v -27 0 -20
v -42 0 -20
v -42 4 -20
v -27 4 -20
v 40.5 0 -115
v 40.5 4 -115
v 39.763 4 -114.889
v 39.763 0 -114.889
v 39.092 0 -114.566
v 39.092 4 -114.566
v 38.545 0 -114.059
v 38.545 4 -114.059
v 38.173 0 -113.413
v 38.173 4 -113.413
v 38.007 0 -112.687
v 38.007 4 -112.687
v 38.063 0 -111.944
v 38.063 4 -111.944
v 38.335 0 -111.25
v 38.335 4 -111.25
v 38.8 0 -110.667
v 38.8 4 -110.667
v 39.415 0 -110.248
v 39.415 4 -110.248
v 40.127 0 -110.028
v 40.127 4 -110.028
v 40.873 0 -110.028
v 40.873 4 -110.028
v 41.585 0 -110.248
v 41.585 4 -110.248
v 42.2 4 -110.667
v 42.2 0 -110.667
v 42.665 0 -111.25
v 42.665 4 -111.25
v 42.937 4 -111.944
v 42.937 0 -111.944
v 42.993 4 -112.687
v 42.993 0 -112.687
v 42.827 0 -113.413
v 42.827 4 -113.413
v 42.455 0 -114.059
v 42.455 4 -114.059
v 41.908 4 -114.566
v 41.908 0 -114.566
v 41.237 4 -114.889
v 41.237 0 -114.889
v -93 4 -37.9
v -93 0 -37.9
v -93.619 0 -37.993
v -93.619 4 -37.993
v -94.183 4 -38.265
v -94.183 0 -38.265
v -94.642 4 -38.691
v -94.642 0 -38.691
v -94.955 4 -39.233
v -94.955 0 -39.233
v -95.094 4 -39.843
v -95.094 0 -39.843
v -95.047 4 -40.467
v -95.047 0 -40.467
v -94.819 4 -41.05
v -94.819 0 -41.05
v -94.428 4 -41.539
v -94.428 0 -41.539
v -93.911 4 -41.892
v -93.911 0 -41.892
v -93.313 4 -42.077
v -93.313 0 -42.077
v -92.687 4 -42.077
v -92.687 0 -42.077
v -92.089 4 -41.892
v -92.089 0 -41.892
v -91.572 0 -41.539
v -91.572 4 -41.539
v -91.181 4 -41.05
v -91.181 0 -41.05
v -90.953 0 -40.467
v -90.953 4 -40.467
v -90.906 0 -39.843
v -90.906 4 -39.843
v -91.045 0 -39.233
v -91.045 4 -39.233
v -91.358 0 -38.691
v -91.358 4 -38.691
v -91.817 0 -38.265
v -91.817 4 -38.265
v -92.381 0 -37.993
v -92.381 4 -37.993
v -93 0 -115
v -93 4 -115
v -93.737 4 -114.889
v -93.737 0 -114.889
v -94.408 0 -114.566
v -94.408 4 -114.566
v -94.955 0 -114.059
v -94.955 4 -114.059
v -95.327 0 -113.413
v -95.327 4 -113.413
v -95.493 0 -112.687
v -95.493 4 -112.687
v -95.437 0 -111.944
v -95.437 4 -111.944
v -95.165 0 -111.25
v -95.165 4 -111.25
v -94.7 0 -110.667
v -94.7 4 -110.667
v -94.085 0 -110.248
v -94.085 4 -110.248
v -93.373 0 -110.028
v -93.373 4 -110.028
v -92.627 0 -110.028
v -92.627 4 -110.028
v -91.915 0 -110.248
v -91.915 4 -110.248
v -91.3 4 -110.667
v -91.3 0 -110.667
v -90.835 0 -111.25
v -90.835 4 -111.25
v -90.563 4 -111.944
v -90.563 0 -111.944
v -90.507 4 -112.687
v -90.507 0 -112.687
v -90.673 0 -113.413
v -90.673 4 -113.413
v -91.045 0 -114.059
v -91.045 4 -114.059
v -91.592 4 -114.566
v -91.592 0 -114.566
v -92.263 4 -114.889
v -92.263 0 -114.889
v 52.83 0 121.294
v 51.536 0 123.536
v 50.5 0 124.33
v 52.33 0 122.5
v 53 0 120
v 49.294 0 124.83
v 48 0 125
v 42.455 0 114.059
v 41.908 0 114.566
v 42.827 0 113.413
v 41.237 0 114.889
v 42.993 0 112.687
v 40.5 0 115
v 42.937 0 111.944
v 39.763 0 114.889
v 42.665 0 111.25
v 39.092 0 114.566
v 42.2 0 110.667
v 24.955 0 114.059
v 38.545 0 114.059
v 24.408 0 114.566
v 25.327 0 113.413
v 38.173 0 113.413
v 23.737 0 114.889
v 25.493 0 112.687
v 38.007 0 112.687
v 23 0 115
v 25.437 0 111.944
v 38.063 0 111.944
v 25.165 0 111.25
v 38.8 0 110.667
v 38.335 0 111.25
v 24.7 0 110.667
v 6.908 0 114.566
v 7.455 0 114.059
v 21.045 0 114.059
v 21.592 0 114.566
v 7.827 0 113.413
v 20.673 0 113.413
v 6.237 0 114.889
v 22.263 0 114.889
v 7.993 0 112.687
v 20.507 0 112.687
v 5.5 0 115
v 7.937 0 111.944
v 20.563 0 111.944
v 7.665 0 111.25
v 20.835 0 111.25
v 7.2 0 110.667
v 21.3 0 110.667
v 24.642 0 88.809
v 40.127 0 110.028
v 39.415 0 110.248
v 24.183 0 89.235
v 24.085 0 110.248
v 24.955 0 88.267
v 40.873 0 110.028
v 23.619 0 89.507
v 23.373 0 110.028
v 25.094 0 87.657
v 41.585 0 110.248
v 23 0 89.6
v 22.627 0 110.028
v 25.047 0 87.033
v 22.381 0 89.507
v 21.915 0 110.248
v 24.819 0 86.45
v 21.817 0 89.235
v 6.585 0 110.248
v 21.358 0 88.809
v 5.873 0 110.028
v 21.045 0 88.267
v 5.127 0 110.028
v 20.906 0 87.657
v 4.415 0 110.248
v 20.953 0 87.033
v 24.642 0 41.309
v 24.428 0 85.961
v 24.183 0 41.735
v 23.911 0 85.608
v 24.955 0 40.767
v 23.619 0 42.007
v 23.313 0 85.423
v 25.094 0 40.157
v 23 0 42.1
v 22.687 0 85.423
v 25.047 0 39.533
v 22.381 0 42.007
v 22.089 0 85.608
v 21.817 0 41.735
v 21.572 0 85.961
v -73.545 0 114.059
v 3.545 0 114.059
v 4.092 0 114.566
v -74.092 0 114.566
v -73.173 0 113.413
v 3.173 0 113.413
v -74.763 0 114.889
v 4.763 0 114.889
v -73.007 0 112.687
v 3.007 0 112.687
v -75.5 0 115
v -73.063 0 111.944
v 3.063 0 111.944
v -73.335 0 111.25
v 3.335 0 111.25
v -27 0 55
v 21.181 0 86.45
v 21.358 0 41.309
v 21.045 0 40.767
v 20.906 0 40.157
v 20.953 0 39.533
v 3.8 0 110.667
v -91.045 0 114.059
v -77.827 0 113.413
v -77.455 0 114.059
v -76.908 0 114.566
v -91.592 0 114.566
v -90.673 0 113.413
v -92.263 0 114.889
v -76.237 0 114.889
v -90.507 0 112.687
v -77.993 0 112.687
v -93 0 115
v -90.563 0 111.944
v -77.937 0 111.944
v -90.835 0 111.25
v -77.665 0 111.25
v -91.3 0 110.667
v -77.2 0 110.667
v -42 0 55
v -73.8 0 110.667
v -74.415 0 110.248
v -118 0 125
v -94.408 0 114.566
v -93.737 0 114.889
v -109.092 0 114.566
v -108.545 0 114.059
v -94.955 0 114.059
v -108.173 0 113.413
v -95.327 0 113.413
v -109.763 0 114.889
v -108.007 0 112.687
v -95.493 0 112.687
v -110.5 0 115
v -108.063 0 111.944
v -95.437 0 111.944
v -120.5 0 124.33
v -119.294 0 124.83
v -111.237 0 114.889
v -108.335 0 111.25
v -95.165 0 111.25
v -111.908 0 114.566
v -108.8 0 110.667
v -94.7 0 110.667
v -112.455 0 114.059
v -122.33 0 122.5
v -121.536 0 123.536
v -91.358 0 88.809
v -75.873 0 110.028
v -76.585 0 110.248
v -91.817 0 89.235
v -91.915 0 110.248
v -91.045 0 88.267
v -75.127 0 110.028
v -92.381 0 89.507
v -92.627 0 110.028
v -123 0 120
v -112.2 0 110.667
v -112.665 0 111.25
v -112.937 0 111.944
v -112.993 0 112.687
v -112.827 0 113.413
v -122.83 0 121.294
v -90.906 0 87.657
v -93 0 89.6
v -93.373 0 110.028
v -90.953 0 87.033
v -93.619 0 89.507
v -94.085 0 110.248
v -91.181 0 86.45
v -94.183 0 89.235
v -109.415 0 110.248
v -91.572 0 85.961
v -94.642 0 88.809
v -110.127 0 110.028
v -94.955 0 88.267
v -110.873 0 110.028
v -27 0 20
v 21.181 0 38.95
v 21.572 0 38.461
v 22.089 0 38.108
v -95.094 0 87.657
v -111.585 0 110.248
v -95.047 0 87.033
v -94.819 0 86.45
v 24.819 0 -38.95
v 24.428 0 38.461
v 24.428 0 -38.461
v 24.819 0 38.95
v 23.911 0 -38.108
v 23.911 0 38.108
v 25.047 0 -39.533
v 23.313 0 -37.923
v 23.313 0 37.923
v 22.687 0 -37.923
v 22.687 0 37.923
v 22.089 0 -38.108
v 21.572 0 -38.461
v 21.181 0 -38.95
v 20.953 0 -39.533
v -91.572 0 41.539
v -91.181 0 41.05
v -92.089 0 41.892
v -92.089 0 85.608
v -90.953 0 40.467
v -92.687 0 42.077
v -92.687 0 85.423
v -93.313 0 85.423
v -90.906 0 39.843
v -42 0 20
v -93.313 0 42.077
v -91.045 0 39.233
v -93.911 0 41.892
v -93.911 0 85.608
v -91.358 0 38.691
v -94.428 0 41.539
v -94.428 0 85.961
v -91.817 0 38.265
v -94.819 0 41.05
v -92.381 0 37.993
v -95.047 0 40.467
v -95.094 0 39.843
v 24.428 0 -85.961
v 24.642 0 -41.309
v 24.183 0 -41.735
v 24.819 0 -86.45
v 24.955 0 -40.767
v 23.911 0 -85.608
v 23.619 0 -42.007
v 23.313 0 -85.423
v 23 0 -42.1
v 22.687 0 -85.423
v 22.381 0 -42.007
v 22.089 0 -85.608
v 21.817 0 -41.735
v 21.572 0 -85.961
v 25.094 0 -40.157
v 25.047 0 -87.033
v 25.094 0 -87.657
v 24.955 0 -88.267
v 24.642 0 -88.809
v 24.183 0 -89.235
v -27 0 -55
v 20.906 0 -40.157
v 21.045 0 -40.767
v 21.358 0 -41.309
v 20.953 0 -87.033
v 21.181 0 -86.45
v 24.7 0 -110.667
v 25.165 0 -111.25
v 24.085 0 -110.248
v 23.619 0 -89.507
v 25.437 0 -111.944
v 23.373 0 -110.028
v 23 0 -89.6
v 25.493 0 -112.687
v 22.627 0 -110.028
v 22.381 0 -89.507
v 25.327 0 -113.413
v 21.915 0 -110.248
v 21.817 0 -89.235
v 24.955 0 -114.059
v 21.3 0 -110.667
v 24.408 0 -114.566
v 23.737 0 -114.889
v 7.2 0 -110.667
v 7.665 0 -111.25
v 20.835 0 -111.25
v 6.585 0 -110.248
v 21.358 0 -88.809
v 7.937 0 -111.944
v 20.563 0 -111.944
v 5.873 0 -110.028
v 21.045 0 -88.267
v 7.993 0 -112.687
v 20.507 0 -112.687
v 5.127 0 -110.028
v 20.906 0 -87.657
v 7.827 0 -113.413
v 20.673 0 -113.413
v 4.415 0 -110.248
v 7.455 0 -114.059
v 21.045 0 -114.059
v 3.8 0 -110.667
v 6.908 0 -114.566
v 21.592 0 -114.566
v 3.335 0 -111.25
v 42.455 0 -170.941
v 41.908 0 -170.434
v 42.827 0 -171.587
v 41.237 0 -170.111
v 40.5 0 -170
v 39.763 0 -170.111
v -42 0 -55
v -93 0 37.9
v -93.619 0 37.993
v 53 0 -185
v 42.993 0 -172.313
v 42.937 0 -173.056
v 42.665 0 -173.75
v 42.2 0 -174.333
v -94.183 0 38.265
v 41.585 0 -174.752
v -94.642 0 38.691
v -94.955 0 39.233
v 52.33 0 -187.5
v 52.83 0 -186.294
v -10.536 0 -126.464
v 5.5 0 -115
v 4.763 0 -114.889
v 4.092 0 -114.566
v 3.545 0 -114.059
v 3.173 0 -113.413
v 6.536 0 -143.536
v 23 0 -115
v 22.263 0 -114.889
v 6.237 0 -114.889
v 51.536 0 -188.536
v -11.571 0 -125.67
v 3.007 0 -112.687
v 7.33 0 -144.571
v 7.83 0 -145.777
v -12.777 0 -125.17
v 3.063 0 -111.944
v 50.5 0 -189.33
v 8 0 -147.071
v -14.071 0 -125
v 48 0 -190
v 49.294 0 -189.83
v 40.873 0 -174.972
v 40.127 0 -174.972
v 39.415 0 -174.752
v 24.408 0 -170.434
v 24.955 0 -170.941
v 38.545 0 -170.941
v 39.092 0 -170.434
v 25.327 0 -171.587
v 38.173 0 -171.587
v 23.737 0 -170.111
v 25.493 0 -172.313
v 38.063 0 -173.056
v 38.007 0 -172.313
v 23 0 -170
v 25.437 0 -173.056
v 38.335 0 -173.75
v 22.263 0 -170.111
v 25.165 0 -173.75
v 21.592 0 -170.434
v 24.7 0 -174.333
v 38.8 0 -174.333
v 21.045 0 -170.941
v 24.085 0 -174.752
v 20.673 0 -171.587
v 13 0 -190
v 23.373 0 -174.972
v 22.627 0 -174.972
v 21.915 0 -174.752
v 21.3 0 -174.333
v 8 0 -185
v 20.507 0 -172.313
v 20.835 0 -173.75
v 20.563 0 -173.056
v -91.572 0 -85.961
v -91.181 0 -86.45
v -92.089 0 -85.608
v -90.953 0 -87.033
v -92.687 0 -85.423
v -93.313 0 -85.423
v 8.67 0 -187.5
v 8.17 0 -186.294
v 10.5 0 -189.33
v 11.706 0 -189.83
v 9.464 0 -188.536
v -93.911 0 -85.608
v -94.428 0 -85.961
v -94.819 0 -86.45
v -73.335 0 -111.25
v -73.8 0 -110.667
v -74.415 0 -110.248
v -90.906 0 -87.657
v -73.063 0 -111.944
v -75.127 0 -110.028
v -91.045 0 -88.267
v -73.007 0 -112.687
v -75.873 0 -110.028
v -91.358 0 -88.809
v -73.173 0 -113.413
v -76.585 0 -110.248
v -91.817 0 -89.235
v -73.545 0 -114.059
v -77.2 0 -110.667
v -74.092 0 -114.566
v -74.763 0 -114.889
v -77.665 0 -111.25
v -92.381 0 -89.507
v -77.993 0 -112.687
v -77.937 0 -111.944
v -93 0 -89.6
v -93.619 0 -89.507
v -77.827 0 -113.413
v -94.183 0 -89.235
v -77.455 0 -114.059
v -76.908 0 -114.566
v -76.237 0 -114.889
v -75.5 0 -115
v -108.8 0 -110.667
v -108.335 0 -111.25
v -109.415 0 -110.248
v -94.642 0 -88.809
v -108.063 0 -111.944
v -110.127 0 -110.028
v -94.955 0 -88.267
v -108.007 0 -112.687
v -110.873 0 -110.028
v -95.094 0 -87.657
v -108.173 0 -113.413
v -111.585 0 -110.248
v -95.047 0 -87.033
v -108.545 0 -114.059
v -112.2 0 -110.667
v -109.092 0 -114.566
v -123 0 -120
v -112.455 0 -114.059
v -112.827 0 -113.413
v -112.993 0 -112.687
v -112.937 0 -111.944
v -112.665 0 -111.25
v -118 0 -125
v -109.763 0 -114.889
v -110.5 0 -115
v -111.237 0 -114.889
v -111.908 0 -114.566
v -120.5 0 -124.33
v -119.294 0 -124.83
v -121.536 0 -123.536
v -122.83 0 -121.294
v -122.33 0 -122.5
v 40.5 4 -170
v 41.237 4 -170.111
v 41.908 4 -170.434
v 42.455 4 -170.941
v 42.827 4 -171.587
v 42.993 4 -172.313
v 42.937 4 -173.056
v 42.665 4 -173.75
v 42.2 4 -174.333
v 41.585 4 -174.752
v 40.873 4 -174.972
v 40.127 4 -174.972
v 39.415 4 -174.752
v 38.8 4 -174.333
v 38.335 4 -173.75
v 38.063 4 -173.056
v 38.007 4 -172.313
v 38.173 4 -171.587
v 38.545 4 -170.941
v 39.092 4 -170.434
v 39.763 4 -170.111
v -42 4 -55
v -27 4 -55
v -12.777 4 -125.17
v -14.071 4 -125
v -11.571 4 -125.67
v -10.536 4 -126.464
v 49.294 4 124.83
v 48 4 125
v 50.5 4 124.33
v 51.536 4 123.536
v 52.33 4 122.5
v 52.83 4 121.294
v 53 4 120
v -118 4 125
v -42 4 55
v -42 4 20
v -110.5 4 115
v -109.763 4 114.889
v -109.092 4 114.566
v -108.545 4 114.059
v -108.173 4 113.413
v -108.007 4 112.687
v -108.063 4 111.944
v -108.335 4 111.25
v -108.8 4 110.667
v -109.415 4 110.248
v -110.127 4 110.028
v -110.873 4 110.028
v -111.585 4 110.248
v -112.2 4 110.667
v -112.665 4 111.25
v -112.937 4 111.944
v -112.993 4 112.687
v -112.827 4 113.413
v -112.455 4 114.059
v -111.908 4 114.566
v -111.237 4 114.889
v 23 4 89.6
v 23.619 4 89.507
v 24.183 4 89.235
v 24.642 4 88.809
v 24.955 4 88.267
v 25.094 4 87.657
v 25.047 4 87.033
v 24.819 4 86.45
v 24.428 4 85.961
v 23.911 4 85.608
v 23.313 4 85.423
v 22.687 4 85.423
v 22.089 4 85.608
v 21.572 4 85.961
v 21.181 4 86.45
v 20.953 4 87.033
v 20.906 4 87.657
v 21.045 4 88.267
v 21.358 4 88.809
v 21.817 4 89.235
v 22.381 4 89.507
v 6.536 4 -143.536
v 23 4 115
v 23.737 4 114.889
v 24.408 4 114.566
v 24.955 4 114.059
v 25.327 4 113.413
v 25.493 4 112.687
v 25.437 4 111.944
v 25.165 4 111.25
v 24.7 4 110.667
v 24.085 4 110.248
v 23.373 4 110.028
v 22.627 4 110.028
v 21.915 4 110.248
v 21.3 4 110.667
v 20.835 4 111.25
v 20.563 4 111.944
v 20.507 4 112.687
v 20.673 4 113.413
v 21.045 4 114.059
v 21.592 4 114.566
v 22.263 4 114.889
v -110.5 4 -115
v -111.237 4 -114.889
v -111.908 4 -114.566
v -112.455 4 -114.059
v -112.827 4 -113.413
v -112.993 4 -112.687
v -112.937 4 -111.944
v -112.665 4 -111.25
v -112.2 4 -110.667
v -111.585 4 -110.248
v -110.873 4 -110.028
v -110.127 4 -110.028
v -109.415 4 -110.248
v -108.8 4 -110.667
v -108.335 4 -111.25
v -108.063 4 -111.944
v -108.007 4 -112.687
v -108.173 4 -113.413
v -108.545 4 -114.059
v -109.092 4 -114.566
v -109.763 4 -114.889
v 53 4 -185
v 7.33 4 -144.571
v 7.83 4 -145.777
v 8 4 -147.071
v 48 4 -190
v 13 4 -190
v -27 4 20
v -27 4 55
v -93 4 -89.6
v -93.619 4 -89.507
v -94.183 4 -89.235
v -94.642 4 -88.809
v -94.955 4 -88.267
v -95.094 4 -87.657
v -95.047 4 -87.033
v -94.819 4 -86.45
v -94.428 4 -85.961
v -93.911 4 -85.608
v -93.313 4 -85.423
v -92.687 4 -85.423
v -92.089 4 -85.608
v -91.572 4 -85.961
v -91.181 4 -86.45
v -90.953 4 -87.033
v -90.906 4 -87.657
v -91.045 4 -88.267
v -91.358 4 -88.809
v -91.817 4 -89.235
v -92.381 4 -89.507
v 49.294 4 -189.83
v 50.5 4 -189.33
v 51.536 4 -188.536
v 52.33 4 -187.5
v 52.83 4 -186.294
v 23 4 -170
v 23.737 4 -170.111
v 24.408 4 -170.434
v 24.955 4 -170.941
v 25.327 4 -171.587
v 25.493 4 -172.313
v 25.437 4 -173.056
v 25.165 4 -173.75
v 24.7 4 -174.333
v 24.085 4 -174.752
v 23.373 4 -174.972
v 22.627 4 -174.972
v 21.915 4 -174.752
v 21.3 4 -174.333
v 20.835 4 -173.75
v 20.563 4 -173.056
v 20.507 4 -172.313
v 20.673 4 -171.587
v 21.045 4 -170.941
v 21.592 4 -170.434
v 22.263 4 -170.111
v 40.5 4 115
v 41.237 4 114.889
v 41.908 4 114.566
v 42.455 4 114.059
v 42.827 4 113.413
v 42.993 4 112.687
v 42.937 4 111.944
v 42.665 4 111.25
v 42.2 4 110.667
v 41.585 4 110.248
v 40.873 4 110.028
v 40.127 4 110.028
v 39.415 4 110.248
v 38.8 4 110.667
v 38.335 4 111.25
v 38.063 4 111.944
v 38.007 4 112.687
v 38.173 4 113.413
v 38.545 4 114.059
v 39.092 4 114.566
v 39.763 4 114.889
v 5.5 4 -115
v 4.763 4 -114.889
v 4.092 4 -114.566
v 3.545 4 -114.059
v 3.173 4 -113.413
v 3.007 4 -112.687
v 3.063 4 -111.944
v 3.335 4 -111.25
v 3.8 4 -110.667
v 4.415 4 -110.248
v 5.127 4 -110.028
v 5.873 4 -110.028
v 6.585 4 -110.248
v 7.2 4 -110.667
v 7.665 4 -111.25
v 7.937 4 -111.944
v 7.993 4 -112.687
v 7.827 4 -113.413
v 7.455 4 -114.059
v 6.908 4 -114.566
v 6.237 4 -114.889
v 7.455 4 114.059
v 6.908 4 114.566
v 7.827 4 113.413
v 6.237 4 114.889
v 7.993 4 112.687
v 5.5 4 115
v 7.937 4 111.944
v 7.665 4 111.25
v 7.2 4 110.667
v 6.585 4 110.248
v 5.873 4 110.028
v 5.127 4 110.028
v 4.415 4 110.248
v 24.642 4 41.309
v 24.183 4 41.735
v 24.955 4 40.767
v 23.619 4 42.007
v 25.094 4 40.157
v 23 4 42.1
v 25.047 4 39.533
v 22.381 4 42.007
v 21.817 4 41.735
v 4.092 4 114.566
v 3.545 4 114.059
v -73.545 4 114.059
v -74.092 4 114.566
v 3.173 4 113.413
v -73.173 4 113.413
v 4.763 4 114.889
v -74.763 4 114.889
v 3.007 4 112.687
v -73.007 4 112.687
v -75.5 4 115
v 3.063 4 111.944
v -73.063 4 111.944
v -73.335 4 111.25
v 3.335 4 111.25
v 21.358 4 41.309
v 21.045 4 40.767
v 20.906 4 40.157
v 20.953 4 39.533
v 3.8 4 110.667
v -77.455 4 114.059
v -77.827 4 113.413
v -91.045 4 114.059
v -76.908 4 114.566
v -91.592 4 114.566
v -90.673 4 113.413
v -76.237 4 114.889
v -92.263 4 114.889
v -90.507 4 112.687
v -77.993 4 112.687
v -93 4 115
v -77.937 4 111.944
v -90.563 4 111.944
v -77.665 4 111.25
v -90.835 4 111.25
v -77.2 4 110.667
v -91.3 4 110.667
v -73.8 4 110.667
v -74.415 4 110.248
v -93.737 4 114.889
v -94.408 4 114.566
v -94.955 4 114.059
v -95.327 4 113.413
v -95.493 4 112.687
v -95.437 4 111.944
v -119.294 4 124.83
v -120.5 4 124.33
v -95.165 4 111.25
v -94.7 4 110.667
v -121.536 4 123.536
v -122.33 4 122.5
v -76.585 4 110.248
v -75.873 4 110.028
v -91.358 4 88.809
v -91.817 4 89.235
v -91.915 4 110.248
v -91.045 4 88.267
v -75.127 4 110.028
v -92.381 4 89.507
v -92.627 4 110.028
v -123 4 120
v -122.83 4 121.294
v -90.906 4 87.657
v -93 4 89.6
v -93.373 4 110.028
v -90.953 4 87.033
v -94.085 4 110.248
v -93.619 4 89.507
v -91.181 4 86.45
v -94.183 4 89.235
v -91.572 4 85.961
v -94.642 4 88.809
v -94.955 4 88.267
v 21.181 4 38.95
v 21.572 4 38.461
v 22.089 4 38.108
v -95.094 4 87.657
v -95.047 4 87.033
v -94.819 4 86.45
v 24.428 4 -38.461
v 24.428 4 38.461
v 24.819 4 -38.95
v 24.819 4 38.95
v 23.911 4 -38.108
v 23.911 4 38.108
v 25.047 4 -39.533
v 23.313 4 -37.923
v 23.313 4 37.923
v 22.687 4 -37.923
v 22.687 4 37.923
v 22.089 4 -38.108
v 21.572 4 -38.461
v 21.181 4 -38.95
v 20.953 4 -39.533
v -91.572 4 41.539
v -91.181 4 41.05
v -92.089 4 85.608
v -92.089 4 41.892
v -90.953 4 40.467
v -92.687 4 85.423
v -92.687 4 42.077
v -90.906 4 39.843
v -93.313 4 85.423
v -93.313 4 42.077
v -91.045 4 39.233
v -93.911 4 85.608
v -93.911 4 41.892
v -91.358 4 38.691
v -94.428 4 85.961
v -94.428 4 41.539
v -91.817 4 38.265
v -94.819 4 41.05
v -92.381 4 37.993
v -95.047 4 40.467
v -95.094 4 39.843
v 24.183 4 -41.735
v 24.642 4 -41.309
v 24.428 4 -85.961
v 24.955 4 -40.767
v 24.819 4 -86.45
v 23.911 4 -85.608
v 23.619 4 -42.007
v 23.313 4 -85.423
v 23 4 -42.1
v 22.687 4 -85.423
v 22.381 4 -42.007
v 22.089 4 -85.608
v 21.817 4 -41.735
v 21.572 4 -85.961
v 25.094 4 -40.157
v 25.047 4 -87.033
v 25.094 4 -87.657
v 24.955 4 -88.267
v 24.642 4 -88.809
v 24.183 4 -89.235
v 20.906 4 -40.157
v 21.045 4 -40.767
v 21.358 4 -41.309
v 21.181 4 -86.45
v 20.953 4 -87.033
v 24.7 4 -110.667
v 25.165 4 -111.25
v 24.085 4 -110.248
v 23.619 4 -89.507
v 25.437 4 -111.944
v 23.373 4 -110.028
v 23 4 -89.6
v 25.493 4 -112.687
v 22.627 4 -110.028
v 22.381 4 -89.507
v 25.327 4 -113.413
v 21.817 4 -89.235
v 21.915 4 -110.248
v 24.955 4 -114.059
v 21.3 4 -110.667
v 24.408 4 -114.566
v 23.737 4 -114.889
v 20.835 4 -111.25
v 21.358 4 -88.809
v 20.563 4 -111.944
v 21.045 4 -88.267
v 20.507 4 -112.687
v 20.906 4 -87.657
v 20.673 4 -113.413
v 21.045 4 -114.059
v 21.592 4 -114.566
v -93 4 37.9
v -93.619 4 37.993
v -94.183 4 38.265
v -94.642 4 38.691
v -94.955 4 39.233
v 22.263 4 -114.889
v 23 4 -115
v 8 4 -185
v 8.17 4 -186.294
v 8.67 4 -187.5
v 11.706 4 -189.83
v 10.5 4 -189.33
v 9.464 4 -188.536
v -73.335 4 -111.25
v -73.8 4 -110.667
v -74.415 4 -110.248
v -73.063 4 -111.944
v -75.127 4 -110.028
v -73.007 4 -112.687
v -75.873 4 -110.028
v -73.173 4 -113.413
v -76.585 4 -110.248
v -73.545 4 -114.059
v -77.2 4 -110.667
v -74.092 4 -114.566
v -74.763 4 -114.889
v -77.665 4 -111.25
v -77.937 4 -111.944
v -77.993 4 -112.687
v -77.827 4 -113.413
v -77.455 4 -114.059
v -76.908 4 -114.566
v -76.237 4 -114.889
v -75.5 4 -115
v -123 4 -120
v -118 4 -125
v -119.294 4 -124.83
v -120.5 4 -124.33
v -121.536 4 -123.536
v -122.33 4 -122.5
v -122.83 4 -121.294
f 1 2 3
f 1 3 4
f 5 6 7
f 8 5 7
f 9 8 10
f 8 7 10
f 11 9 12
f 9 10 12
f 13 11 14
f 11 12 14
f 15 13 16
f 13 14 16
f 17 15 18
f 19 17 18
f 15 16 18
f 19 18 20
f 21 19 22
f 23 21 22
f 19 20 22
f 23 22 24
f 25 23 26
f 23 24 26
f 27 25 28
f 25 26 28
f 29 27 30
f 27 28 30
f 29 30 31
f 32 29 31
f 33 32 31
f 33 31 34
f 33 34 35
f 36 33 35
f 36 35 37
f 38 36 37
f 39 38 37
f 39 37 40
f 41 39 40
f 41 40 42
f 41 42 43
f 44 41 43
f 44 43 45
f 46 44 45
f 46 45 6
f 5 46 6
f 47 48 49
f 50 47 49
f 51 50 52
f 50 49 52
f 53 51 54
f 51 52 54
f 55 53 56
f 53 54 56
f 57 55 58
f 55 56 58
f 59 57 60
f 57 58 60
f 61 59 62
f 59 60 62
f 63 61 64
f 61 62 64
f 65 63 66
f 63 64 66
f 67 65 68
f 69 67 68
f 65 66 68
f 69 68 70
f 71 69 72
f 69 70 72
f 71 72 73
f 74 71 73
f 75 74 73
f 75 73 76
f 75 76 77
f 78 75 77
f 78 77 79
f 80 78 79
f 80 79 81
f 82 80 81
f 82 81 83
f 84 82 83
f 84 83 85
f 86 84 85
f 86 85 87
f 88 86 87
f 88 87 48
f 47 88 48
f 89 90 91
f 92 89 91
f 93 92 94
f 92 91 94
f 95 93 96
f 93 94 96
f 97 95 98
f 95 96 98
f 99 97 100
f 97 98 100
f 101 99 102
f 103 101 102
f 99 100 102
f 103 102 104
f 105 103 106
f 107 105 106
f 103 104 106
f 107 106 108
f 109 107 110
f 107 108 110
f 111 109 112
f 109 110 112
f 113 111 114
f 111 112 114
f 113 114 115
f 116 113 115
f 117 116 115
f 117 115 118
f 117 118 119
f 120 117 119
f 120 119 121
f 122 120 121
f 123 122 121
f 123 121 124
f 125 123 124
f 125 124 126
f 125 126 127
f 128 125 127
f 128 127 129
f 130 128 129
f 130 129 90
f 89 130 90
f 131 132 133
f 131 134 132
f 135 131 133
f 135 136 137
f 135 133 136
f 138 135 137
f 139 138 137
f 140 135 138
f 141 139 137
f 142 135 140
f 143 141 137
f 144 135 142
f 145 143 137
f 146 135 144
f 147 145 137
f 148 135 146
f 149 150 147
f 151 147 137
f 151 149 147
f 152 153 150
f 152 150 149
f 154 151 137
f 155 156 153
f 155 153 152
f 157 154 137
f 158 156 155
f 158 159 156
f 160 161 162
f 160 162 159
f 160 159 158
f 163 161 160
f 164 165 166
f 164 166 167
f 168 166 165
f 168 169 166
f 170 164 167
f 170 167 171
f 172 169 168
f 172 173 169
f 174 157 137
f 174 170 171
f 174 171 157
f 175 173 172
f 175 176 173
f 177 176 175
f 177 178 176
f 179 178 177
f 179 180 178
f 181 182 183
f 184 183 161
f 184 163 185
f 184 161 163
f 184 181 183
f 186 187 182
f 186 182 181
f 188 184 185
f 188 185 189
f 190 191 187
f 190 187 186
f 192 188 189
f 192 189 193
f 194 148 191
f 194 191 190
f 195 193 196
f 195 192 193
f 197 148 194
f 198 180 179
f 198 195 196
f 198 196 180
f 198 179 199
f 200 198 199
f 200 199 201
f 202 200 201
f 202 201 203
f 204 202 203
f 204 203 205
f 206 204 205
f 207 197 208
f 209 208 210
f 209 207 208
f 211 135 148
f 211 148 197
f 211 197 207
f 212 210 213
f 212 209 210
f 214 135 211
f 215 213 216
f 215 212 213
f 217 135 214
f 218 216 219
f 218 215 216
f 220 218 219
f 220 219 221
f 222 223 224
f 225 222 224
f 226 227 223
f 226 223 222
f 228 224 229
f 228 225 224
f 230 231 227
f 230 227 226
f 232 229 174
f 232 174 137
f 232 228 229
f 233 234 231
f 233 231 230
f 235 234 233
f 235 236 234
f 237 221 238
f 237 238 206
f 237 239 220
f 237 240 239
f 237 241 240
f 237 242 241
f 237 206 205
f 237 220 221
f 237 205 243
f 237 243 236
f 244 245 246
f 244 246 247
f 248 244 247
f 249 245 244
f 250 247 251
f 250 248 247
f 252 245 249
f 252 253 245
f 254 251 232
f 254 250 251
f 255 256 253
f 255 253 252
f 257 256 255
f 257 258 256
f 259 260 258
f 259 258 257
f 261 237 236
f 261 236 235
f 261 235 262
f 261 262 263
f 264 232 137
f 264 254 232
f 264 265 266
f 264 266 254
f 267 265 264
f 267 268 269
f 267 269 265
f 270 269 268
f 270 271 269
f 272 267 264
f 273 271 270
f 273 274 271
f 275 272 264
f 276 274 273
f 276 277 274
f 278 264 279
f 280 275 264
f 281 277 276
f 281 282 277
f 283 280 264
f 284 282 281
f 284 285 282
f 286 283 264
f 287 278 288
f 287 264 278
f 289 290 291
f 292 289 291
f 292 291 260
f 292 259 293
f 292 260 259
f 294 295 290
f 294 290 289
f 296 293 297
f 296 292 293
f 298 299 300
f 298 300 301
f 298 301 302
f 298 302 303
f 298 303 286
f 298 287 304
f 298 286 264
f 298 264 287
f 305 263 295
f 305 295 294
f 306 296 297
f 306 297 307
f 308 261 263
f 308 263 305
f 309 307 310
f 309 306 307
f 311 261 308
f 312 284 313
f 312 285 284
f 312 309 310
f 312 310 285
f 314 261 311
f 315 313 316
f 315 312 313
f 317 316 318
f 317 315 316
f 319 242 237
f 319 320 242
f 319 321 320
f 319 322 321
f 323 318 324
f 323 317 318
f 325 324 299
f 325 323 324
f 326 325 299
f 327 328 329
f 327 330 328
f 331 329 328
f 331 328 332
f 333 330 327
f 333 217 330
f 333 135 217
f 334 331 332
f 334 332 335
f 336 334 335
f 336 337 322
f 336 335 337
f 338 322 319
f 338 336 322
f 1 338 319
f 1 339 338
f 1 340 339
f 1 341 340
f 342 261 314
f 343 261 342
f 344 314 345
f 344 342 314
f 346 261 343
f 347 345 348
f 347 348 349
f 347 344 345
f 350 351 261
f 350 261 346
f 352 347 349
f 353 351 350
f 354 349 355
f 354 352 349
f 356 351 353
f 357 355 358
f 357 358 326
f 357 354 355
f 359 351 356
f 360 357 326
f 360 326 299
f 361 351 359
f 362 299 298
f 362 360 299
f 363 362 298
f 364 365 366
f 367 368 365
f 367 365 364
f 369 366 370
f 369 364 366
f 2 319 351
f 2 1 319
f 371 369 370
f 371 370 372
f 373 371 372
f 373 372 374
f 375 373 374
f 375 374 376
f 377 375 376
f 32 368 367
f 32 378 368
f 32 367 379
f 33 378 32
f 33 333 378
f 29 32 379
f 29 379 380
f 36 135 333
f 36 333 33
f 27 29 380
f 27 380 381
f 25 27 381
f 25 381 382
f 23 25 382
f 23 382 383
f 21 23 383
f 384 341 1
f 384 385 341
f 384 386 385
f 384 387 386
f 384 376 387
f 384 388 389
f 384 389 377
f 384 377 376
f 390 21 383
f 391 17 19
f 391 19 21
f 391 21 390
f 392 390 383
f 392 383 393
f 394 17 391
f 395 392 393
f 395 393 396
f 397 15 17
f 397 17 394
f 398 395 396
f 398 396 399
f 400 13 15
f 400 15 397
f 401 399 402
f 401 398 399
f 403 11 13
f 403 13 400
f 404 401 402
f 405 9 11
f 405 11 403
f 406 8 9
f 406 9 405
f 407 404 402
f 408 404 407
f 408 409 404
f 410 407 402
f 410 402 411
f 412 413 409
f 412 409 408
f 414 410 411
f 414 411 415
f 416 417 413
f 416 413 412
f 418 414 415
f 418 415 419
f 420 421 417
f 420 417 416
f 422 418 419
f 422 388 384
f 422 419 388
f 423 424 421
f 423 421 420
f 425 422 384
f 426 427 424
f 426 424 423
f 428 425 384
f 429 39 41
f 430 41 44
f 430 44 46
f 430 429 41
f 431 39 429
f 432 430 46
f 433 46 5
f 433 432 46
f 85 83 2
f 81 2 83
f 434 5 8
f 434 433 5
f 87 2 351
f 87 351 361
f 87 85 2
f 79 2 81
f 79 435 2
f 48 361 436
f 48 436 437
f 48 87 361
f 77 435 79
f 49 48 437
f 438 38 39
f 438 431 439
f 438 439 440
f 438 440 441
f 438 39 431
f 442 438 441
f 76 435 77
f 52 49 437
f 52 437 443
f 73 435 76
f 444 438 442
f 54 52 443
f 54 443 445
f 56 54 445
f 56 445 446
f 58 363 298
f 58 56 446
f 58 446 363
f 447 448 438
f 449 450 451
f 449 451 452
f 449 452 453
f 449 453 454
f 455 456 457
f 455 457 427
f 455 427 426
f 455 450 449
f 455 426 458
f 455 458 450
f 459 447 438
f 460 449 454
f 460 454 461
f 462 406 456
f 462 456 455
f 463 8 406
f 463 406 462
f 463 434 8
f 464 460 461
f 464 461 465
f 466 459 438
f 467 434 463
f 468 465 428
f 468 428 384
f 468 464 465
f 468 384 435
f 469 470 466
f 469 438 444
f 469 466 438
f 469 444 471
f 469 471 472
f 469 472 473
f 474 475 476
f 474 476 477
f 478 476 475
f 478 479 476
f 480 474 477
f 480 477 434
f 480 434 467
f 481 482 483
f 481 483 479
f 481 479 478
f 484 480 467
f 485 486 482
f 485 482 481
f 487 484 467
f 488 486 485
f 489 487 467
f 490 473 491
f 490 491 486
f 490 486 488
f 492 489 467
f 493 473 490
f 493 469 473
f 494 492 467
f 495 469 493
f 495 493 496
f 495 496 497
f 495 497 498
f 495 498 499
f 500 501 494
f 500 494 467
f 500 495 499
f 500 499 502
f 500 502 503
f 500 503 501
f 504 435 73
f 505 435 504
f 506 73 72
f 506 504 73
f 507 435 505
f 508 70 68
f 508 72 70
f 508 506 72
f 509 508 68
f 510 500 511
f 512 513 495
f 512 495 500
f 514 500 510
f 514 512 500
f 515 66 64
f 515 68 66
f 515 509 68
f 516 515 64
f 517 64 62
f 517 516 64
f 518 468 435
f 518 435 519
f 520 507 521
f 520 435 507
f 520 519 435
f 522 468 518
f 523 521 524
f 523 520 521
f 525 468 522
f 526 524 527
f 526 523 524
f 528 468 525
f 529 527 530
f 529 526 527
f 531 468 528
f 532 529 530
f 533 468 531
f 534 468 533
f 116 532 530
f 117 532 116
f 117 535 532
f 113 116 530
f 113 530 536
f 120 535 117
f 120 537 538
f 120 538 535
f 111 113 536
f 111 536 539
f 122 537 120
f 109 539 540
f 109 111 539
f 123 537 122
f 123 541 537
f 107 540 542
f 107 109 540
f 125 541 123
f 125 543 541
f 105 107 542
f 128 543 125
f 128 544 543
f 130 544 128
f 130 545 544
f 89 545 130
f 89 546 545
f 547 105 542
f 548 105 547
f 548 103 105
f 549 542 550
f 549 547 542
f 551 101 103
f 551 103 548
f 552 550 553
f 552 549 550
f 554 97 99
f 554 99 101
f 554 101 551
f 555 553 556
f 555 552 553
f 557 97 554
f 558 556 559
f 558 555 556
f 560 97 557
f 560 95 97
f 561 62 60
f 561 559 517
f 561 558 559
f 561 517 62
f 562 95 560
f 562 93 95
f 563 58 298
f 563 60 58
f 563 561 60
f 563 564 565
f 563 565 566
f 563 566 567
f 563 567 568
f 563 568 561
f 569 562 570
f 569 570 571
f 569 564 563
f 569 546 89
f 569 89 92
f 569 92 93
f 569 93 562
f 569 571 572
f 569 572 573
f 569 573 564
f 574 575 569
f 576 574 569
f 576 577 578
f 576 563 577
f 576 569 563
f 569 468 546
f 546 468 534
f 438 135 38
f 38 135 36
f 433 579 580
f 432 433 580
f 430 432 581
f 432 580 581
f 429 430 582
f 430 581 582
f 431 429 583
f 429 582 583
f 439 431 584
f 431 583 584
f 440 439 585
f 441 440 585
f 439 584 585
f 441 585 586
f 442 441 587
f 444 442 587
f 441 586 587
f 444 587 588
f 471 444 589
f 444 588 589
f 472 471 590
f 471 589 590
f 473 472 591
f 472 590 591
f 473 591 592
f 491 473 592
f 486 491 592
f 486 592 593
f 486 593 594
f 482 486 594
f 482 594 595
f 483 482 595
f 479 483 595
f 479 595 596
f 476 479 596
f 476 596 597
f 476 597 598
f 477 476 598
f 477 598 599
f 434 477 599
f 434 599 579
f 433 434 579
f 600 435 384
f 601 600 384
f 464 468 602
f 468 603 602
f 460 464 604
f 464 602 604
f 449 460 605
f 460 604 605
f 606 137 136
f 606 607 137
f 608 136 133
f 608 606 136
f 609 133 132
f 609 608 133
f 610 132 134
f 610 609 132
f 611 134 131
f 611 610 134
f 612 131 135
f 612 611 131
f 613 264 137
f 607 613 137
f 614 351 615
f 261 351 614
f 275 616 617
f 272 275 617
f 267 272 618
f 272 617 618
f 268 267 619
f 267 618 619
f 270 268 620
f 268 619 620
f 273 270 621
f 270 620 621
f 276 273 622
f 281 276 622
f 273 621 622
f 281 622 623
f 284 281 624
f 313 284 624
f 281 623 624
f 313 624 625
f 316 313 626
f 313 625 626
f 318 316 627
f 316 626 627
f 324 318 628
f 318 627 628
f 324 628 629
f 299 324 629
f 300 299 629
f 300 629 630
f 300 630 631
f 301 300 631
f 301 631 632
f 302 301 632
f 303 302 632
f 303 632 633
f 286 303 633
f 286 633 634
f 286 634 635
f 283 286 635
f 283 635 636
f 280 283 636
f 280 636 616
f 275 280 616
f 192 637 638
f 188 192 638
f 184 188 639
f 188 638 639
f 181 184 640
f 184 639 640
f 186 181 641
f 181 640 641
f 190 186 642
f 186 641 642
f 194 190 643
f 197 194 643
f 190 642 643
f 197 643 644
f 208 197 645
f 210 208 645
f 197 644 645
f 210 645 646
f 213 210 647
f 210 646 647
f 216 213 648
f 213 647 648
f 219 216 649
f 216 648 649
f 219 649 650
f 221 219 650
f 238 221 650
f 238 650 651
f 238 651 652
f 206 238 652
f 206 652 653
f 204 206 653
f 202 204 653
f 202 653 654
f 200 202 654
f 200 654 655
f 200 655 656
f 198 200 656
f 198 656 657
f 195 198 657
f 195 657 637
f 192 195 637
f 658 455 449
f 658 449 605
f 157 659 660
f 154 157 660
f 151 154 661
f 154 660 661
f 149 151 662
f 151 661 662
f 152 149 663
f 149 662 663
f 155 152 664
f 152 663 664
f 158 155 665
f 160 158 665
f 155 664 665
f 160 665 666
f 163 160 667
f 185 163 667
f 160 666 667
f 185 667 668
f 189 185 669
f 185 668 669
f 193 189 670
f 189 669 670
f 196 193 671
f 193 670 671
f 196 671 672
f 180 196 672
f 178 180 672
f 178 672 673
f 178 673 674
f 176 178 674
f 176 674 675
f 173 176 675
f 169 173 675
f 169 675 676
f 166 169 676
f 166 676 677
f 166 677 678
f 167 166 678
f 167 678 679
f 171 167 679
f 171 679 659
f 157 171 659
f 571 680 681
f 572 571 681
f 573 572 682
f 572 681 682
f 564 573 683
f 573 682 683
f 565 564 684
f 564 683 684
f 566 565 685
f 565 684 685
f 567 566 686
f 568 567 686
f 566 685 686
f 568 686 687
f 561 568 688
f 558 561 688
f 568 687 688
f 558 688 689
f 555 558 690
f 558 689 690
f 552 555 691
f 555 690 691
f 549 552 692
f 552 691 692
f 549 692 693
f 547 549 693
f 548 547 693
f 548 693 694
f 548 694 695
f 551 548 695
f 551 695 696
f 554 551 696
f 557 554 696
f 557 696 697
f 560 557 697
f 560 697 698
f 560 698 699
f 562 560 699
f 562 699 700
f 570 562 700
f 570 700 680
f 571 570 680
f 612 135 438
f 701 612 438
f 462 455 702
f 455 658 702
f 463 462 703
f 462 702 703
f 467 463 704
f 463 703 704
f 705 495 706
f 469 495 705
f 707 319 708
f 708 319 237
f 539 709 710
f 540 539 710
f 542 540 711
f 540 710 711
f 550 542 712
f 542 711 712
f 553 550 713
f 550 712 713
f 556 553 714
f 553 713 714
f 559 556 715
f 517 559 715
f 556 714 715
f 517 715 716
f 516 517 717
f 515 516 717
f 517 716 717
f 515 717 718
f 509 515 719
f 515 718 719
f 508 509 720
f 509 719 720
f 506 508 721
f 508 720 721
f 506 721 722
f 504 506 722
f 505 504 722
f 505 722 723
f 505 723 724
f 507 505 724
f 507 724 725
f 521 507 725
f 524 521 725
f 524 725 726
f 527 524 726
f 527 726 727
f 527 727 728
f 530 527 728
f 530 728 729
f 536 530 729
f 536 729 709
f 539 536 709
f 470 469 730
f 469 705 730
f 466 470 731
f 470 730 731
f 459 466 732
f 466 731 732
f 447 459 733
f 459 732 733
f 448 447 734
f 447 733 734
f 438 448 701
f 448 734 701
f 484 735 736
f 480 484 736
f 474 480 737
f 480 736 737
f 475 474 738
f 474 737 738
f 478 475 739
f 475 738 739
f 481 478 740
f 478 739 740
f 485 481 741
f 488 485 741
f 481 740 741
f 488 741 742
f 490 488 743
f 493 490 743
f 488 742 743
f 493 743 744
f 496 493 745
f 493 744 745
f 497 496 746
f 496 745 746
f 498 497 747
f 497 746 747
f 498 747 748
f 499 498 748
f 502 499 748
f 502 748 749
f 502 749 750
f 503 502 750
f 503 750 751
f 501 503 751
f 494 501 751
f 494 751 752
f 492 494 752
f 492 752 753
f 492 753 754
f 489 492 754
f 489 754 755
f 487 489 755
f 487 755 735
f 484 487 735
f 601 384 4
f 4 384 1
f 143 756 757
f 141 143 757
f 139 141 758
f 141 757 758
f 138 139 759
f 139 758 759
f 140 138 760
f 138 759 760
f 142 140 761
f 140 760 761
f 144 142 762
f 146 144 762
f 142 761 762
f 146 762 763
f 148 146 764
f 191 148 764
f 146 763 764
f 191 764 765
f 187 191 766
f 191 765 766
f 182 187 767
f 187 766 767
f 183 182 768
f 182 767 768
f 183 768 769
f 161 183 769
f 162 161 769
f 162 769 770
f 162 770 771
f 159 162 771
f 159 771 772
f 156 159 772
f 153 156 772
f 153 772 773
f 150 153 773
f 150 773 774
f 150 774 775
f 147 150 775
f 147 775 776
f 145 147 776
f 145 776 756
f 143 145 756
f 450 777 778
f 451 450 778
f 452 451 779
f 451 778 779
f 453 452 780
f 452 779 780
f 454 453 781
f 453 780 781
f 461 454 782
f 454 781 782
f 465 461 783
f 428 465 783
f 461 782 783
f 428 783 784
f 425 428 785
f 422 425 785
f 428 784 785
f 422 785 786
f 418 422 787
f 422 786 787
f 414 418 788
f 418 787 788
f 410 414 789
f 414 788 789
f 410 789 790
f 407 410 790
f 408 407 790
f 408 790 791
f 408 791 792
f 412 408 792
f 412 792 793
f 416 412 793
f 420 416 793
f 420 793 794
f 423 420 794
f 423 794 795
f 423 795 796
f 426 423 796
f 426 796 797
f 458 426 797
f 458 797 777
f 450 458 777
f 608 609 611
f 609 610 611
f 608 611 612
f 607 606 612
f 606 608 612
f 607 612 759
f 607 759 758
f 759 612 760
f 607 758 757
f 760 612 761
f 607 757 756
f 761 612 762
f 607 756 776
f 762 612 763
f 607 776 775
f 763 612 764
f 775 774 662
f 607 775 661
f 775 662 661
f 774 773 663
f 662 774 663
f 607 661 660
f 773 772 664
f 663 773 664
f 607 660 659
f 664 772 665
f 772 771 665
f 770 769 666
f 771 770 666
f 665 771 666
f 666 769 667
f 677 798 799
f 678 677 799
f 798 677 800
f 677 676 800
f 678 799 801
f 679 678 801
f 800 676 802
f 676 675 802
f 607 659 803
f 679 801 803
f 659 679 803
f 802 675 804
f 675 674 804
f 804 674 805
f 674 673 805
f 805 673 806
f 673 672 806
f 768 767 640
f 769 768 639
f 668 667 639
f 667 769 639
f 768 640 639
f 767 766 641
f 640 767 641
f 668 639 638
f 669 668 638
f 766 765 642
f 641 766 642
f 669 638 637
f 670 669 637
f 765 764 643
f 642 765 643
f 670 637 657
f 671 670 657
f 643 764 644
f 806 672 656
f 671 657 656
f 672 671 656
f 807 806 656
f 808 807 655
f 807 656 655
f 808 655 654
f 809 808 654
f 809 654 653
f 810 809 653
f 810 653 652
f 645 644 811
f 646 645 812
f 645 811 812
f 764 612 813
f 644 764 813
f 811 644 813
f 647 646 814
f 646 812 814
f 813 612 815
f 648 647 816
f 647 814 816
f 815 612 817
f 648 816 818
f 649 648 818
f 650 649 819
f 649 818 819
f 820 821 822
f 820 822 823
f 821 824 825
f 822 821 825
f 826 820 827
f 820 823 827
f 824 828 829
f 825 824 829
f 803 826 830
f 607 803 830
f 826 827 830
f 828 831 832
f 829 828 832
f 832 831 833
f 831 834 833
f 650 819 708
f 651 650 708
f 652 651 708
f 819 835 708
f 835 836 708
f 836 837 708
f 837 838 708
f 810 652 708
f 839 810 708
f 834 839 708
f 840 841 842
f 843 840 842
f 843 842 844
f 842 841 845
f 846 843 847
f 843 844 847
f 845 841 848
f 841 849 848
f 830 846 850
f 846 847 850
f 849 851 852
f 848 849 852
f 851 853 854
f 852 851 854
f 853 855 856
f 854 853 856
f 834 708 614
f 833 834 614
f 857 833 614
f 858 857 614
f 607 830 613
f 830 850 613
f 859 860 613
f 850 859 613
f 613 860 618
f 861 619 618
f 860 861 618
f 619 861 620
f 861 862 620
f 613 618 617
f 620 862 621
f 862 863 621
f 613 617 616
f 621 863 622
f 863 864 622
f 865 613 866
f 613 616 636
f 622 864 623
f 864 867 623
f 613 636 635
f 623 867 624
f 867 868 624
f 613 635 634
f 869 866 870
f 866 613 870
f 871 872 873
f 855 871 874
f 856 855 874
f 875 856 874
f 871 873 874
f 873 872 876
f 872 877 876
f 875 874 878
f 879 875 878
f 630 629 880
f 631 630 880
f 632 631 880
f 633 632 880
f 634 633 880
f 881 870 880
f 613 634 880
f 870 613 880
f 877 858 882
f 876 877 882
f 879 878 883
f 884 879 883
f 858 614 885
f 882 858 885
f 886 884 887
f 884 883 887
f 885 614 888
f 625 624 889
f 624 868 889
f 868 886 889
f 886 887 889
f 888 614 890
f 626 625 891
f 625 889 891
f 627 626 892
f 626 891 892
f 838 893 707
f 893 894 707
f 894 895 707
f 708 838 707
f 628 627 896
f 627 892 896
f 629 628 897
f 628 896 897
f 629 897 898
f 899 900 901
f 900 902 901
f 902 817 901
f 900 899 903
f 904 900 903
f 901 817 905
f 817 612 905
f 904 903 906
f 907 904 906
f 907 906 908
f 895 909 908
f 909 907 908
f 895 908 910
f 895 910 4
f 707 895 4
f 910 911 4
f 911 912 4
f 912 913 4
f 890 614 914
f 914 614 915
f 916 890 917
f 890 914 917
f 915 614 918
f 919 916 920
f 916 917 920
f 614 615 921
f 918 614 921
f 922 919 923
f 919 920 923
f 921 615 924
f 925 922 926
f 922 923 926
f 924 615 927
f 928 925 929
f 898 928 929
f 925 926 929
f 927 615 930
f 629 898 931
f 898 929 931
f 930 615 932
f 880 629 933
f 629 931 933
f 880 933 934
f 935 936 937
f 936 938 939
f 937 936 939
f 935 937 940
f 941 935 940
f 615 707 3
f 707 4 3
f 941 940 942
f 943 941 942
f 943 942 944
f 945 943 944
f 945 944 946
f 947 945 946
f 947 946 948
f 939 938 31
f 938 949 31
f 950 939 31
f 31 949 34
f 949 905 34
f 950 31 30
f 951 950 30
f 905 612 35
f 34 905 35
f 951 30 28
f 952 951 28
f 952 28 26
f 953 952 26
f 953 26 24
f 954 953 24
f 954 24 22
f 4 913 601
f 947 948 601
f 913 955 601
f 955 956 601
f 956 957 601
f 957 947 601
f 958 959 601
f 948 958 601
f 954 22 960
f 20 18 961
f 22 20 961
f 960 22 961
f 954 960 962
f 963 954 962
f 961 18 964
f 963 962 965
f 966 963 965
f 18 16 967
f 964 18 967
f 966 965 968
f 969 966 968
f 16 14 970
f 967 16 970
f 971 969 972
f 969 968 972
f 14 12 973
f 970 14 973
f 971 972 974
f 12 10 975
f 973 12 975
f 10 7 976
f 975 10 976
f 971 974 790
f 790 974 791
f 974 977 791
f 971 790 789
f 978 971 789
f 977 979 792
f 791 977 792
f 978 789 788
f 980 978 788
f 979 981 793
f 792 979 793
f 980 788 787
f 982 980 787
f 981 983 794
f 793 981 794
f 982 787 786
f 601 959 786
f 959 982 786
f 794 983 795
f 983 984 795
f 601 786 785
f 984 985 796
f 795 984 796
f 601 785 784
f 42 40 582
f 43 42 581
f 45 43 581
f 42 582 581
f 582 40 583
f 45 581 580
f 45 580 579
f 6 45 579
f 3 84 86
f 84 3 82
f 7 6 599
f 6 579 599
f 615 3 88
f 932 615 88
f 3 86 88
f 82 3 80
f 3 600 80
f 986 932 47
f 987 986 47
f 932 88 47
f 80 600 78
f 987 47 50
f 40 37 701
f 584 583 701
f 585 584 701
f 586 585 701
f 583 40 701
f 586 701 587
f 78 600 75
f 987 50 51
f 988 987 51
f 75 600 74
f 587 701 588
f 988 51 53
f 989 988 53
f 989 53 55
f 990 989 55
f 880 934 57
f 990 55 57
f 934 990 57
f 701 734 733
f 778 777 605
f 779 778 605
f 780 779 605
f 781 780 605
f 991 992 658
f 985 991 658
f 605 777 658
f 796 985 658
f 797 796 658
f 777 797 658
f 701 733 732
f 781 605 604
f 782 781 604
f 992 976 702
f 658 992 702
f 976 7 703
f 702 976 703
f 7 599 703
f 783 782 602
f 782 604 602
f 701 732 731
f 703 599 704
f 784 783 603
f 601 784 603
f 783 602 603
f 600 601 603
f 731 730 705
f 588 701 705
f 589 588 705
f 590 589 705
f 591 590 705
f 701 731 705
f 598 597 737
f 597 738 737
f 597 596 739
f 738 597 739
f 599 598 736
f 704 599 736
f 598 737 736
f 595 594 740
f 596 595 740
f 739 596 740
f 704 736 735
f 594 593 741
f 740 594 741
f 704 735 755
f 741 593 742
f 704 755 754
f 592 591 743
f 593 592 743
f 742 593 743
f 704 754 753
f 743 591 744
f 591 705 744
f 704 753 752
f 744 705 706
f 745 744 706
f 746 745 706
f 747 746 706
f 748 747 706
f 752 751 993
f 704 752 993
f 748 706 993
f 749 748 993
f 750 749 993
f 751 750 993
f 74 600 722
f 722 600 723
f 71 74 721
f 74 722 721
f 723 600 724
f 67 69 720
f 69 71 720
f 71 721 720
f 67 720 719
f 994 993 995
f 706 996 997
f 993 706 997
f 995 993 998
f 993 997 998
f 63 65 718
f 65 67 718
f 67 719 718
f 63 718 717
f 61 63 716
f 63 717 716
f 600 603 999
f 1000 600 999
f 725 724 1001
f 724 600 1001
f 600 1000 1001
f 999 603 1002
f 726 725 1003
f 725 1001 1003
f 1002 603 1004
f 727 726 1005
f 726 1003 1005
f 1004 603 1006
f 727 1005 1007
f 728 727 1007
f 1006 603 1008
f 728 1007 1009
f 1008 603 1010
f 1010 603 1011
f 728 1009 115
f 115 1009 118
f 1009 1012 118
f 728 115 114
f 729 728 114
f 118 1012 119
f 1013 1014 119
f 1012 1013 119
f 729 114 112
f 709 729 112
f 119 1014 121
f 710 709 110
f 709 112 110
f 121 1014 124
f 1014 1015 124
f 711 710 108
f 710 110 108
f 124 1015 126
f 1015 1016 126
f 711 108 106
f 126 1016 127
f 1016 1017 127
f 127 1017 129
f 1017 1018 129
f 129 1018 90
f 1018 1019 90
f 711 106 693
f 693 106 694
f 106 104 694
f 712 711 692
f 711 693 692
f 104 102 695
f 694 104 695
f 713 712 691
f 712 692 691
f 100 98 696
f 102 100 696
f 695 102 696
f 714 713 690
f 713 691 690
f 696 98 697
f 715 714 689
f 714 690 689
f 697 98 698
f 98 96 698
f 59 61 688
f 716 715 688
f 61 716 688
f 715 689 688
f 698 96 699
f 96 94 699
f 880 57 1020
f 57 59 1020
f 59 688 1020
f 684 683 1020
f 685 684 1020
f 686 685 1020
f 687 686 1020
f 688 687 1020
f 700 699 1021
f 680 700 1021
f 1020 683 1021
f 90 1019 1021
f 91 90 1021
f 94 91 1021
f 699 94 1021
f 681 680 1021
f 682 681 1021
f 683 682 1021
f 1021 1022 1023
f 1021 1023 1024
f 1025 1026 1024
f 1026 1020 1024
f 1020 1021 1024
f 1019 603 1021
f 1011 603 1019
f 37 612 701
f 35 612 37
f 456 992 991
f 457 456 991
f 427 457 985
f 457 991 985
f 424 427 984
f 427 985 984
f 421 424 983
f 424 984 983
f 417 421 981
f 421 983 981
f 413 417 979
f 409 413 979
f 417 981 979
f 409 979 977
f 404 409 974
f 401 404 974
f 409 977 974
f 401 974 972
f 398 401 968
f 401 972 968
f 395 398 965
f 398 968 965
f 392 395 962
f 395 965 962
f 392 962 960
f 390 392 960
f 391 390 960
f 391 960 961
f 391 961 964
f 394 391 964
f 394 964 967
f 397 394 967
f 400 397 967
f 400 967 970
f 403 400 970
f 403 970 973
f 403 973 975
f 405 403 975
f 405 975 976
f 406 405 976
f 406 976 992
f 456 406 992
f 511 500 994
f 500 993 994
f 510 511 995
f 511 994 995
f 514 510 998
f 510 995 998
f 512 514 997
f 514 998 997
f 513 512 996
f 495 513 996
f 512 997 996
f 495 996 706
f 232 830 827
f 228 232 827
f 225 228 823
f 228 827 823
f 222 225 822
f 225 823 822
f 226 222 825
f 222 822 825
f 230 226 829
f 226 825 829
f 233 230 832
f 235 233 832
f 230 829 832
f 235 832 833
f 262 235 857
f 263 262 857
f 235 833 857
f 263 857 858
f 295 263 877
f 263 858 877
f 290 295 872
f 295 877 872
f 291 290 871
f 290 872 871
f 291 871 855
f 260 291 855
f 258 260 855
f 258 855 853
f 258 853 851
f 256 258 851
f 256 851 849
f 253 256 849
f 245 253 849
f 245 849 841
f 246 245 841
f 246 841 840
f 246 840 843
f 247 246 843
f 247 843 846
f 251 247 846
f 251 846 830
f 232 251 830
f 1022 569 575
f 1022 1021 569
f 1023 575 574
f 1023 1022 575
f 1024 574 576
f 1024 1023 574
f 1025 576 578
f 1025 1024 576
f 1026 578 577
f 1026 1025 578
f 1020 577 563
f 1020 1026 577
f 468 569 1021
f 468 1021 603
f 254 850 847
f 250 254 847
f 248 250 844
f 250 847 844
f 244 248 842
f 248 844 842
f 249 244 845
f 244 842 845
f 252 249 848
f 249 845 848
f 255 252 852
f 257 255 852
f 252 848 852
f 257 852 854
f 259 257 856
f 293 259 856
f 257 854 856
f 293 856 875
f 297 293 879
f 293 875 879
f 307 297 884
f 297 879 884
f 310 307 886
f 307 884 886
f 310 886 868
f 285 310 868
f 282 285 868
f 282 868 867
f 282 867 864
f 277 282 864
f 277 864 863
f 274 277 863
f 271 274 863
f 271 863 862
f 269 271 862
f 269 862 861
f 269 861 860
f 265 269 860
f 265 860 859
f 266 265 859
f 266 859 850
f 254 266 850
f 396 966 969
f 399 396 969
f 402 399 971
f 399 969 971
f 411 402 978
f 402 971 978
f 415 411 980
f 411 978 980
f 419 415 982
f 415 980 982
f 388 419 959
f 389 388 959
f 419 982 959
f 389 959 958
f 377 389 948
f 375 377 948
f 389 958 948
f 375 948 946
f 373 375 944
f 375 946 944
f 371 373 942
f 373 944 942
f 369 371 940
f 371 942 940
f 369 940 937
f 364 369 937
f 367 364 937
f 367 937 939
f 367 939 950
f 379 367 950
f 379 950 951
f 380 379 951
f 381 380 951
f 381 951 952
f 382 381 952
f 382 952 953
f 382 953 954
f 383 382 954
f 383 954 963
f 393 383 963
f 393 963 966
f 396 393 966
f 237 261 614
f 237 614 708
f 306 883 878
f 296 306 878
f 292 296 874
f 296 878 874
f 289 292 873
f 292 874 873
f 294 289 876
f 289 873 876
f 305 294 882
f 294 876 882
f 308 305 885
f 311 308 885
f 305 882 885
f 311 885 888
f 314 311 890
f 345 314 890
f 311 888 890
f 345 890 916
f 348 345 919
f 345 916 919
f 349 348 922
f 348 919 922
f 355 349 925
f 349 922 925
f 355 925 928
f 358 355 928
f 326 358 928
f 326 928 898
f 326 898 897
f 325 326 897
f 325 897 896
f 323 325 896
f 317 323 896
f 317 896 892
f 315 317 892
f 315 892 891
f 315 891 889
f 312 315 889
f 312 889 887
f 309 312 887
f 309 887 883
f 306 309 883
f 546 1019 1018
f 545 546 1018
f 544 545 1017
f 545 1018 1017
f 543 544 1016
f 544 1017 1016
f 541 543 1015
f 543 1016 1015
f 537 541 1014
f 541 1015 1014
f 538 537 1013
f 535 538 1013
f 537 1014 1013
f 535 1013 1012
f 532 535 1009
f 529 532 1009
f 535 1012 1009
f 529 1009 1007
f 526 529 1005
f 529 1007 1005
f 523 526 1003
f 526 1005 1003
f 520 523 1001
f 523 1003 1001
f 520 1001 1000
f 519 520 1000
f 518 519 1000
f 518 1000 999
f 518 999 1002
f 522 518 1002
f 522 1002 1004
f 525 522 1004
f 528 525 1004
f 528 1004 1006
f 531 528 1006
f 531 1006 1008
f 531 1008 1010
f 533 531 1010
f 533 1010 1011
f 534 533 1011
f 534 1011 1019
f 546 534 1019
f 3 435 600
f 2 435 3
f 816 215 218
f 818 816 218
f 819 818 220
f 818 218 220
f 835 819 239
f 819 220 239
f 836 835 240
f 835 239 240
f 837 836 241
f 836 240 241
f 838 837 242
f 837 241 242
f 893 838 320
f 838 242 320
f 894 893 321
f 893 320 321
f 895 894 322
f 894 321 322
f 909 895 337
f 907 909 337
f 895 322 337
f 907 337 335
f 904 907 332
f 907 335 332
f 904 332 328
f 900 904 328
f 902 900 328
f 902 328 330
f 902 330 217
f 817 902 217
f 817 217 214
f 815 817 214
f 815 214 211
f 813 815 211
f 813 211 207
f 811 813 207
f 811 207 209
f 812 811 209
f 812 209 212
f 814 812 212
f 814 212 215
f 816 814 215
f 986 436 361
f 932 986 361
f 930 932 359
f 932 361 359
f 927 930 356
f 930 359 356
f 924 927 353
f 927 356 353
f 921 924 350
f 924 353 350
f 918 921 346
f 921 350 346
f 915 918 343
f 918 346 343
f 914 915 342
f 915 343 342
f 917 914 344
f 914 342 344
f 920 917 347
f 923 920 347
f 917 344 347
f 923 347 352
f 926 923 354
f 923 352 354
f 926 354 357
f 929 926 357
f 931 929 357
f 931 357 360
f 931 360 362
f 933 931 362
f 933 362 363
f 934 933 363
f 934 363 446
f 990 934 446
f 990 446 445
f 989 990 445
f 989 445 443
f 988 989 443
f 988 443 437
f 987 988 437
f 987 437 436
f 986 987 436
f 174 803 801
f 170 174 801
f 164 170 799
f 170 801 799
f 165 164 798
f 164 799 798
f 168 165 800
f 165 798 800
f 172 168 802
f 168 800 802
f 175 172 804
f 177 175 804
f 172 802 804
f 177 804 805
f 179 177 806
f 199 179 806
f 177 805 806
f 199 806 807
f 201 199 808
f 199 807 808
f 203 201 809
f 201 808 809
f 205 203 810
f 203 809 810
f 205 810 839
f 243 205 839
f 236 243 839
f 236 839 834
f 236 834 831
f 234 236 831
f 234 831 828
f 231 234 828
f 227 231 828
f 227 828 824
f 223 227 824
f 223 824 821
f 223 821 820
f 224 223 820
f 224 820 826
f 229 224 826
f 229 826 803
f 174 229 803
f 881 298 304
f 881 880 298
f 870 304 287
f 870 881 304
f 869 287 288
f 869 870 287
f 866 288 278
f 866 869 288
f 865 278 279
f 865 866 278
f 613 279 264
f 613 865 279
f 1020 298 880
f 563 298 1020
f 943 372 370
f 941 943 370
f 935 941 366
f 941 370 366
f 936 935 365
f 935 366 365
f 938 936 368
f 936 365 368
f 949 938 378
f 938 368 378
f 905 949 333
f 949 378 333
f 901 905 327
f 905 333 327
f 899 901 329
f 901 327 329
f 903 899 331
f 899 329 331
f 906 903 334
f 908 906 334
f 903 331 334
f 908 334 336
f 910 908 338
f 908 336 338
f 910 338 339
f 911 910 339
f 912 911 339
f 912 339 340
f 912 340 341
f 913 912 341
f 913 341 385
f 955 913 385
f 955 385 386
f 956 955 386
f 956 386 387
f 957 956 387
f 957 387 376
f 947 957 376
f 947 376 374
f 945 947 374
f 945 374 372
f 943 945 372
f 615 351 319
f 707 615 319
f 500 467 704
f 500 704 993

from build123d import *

# Parameters (mm, degrees)
BOSS_EXTRUDE1_DEPTH = 4
SKETCH2_R           = 2.5
SKETCH2_R_2         = 2.1
CUT_EXTRUDE1_DEPTH  = 227.373585031
SKETCH3_W           = 15
SKETCH3_H           = 35
CUT_EXTRUDE2_DEPTH  = 227.373585031
SKETCH4_R           = 2.1
CUT_EXTRUDE3_DEPTH  = 10
CHAMFER1_SIZE       = 20
FILLET1_R           = 5


with BuildPart() as part:
    # Sketch1 → Boss-Extrude1 (new body)
    with BuildSketch(Plane(origin=(0, 0, 0), x_dir=(1, 0, 0), z_dir=(0, 1, 0))):
        Polygon((-123, 125), (8, 125), (8, 190), (53, 190), (53, 125), (53, -125), (-53, -125), (-123, -125), align=None)
    extrude(amount=BOSS_EXTRUDE1_DEPTH)

    # Sketch2 → Cut-Extrude1 (cut, through all)
    with BuildSketch(Plane(origin=(0, 4, 0), x_dir=(1, 0, 0), z_dir=(0, 1, 0))):
        with Locations(Location((-110.5, -112.5, 0), (0, 0, 270))):
            Circle(SKETCH2_R)
        with Locations(Location((-75.5, -112.5, 0), (0, 0, 270))):
            Circle(SKETCH2_R)
        with Locations(Location((-93, -112.5, 0), (0, 0, 270))):
            Circle(SKETCH2_R)
        with Locations(Location((-93, -87.5, 0), (0, 0, 270))):
            Circle(SKETCH2_R_2)
        with Locations(Location((5.5, -112.5, 0), (0, 0, 270))):
            Circle(SKETCH2_R)
        with Locations(Location((23, -112.5, 0), (0, 0, 270))):
            Circle(SKETCH2_R)
        with Locations(Location((40.5, -112.5, 0), (0, 0, 270))):
            Circle(SKETCH2_R)
        with Locations(Location((23, -87.5, 0), (0, 0, 270))):
            Circle(SKETCH2_R_2)
        with Locations(Location((23, 87.5, 0), (0, 0, 90))):
            Circle(SKETCH2_R_2)
        with Locations(Location((40.5, 112.5, 0), (0, 0, 90))):
            Circle(SKETCH2_R)
        with Locations(Location((23, 112.5, 0), (0, 0, 90))):
            Circle(SKETCH2_R)
        with Locations(Location((5.5, 112.5, 0), (0, 0, 90))):
            Circle(SKETCH2_R)
        with Locations(Location((-93, 87.5, 0), (0, 0, 90))):
            Circle(SKETCH2_R_2)
        with Locations(Location((-93, 112.5, 0), (0, 0, 90))):
            Circle(SKETCH2_R)
        with Locations(Location((-75.5, 112.5, 0), (0, 0, 90))):
            Circle(SKETCH2_R)
        with Locations(Location((-110.5, 112.5, 0), (0, 0, 90))):
            Circle(SKETCH2_R)
        with Locations(Location((40.5, 172.5, 0), (0, 0, 270))):
            Circle(SKETCH2_R)
        with Locations(Location((23, 172.5, 0), (0, 0, 270))):
            Circle(SKETCH2_R)
    extrude(amount=-CUT_EXTRUDE1_DEPTH, mode=Mode.SUBTRACT)

    # Sketch3 → Cut-Extrude2 (cut, through all)
    with BuildSketch(Plane.XZ):
        with Locations((-34.5, 37.5)):
            Rectangle(SKETCH3_W, SKETCH3_H)
        with Locations((-34.5, -37.5)):
            Rectangle(SKETCH3_W, SKETCH3_H)
    extrude(amount=-CUT_EXTRUDE2_DEPTH, mode=Mode.SUBTRACT)

    # Sketch4 → Cut-Extrude3 (cut)
    with BuildSketch(Plane.XZ):
        with Locations(Location((-93, 40, 0), (0, 0, 270))):
            Circle(SKETCH4_R)
        with Locations(Location((-93, -40, 0), (0, 0, 90))):
            Circle(SKETCH4_R)
        with Locations(Location((23, -40, 0), (0, 0, 270))):
            Circle(SKETCH4_R)
        with Locations(Location((23, 40, 0), (0, 0, 90))):
            Circle(SKETCH4_R)
    extrude(amount=-CUT_EXTRUDE3_DEPTH, mode=Mode.SUBTRACT)

    # Chamfer1
    chamfer1_edges = [part.edges().sort_by_distance(p)[0] for p in [
        (8, 2, -125),
    ]]
    chamfer(chamfer1_edges, length=CHAMFER1_SIZE)

    # Fillet1
    fillet1_edges = [part.edges().sort_by_distance(p)[0] for p in [
        (-123, 2, -125),
        (8, 2, -190),
        (53, 2, -190),
        (53, 2, 125),
        (-123, 2, 125),
        (-12, 2, -125),
        (8, 2, -145),
    ]]
    fillet(fillet1_edges, radius=FILLET1_R)


solid = part.part
